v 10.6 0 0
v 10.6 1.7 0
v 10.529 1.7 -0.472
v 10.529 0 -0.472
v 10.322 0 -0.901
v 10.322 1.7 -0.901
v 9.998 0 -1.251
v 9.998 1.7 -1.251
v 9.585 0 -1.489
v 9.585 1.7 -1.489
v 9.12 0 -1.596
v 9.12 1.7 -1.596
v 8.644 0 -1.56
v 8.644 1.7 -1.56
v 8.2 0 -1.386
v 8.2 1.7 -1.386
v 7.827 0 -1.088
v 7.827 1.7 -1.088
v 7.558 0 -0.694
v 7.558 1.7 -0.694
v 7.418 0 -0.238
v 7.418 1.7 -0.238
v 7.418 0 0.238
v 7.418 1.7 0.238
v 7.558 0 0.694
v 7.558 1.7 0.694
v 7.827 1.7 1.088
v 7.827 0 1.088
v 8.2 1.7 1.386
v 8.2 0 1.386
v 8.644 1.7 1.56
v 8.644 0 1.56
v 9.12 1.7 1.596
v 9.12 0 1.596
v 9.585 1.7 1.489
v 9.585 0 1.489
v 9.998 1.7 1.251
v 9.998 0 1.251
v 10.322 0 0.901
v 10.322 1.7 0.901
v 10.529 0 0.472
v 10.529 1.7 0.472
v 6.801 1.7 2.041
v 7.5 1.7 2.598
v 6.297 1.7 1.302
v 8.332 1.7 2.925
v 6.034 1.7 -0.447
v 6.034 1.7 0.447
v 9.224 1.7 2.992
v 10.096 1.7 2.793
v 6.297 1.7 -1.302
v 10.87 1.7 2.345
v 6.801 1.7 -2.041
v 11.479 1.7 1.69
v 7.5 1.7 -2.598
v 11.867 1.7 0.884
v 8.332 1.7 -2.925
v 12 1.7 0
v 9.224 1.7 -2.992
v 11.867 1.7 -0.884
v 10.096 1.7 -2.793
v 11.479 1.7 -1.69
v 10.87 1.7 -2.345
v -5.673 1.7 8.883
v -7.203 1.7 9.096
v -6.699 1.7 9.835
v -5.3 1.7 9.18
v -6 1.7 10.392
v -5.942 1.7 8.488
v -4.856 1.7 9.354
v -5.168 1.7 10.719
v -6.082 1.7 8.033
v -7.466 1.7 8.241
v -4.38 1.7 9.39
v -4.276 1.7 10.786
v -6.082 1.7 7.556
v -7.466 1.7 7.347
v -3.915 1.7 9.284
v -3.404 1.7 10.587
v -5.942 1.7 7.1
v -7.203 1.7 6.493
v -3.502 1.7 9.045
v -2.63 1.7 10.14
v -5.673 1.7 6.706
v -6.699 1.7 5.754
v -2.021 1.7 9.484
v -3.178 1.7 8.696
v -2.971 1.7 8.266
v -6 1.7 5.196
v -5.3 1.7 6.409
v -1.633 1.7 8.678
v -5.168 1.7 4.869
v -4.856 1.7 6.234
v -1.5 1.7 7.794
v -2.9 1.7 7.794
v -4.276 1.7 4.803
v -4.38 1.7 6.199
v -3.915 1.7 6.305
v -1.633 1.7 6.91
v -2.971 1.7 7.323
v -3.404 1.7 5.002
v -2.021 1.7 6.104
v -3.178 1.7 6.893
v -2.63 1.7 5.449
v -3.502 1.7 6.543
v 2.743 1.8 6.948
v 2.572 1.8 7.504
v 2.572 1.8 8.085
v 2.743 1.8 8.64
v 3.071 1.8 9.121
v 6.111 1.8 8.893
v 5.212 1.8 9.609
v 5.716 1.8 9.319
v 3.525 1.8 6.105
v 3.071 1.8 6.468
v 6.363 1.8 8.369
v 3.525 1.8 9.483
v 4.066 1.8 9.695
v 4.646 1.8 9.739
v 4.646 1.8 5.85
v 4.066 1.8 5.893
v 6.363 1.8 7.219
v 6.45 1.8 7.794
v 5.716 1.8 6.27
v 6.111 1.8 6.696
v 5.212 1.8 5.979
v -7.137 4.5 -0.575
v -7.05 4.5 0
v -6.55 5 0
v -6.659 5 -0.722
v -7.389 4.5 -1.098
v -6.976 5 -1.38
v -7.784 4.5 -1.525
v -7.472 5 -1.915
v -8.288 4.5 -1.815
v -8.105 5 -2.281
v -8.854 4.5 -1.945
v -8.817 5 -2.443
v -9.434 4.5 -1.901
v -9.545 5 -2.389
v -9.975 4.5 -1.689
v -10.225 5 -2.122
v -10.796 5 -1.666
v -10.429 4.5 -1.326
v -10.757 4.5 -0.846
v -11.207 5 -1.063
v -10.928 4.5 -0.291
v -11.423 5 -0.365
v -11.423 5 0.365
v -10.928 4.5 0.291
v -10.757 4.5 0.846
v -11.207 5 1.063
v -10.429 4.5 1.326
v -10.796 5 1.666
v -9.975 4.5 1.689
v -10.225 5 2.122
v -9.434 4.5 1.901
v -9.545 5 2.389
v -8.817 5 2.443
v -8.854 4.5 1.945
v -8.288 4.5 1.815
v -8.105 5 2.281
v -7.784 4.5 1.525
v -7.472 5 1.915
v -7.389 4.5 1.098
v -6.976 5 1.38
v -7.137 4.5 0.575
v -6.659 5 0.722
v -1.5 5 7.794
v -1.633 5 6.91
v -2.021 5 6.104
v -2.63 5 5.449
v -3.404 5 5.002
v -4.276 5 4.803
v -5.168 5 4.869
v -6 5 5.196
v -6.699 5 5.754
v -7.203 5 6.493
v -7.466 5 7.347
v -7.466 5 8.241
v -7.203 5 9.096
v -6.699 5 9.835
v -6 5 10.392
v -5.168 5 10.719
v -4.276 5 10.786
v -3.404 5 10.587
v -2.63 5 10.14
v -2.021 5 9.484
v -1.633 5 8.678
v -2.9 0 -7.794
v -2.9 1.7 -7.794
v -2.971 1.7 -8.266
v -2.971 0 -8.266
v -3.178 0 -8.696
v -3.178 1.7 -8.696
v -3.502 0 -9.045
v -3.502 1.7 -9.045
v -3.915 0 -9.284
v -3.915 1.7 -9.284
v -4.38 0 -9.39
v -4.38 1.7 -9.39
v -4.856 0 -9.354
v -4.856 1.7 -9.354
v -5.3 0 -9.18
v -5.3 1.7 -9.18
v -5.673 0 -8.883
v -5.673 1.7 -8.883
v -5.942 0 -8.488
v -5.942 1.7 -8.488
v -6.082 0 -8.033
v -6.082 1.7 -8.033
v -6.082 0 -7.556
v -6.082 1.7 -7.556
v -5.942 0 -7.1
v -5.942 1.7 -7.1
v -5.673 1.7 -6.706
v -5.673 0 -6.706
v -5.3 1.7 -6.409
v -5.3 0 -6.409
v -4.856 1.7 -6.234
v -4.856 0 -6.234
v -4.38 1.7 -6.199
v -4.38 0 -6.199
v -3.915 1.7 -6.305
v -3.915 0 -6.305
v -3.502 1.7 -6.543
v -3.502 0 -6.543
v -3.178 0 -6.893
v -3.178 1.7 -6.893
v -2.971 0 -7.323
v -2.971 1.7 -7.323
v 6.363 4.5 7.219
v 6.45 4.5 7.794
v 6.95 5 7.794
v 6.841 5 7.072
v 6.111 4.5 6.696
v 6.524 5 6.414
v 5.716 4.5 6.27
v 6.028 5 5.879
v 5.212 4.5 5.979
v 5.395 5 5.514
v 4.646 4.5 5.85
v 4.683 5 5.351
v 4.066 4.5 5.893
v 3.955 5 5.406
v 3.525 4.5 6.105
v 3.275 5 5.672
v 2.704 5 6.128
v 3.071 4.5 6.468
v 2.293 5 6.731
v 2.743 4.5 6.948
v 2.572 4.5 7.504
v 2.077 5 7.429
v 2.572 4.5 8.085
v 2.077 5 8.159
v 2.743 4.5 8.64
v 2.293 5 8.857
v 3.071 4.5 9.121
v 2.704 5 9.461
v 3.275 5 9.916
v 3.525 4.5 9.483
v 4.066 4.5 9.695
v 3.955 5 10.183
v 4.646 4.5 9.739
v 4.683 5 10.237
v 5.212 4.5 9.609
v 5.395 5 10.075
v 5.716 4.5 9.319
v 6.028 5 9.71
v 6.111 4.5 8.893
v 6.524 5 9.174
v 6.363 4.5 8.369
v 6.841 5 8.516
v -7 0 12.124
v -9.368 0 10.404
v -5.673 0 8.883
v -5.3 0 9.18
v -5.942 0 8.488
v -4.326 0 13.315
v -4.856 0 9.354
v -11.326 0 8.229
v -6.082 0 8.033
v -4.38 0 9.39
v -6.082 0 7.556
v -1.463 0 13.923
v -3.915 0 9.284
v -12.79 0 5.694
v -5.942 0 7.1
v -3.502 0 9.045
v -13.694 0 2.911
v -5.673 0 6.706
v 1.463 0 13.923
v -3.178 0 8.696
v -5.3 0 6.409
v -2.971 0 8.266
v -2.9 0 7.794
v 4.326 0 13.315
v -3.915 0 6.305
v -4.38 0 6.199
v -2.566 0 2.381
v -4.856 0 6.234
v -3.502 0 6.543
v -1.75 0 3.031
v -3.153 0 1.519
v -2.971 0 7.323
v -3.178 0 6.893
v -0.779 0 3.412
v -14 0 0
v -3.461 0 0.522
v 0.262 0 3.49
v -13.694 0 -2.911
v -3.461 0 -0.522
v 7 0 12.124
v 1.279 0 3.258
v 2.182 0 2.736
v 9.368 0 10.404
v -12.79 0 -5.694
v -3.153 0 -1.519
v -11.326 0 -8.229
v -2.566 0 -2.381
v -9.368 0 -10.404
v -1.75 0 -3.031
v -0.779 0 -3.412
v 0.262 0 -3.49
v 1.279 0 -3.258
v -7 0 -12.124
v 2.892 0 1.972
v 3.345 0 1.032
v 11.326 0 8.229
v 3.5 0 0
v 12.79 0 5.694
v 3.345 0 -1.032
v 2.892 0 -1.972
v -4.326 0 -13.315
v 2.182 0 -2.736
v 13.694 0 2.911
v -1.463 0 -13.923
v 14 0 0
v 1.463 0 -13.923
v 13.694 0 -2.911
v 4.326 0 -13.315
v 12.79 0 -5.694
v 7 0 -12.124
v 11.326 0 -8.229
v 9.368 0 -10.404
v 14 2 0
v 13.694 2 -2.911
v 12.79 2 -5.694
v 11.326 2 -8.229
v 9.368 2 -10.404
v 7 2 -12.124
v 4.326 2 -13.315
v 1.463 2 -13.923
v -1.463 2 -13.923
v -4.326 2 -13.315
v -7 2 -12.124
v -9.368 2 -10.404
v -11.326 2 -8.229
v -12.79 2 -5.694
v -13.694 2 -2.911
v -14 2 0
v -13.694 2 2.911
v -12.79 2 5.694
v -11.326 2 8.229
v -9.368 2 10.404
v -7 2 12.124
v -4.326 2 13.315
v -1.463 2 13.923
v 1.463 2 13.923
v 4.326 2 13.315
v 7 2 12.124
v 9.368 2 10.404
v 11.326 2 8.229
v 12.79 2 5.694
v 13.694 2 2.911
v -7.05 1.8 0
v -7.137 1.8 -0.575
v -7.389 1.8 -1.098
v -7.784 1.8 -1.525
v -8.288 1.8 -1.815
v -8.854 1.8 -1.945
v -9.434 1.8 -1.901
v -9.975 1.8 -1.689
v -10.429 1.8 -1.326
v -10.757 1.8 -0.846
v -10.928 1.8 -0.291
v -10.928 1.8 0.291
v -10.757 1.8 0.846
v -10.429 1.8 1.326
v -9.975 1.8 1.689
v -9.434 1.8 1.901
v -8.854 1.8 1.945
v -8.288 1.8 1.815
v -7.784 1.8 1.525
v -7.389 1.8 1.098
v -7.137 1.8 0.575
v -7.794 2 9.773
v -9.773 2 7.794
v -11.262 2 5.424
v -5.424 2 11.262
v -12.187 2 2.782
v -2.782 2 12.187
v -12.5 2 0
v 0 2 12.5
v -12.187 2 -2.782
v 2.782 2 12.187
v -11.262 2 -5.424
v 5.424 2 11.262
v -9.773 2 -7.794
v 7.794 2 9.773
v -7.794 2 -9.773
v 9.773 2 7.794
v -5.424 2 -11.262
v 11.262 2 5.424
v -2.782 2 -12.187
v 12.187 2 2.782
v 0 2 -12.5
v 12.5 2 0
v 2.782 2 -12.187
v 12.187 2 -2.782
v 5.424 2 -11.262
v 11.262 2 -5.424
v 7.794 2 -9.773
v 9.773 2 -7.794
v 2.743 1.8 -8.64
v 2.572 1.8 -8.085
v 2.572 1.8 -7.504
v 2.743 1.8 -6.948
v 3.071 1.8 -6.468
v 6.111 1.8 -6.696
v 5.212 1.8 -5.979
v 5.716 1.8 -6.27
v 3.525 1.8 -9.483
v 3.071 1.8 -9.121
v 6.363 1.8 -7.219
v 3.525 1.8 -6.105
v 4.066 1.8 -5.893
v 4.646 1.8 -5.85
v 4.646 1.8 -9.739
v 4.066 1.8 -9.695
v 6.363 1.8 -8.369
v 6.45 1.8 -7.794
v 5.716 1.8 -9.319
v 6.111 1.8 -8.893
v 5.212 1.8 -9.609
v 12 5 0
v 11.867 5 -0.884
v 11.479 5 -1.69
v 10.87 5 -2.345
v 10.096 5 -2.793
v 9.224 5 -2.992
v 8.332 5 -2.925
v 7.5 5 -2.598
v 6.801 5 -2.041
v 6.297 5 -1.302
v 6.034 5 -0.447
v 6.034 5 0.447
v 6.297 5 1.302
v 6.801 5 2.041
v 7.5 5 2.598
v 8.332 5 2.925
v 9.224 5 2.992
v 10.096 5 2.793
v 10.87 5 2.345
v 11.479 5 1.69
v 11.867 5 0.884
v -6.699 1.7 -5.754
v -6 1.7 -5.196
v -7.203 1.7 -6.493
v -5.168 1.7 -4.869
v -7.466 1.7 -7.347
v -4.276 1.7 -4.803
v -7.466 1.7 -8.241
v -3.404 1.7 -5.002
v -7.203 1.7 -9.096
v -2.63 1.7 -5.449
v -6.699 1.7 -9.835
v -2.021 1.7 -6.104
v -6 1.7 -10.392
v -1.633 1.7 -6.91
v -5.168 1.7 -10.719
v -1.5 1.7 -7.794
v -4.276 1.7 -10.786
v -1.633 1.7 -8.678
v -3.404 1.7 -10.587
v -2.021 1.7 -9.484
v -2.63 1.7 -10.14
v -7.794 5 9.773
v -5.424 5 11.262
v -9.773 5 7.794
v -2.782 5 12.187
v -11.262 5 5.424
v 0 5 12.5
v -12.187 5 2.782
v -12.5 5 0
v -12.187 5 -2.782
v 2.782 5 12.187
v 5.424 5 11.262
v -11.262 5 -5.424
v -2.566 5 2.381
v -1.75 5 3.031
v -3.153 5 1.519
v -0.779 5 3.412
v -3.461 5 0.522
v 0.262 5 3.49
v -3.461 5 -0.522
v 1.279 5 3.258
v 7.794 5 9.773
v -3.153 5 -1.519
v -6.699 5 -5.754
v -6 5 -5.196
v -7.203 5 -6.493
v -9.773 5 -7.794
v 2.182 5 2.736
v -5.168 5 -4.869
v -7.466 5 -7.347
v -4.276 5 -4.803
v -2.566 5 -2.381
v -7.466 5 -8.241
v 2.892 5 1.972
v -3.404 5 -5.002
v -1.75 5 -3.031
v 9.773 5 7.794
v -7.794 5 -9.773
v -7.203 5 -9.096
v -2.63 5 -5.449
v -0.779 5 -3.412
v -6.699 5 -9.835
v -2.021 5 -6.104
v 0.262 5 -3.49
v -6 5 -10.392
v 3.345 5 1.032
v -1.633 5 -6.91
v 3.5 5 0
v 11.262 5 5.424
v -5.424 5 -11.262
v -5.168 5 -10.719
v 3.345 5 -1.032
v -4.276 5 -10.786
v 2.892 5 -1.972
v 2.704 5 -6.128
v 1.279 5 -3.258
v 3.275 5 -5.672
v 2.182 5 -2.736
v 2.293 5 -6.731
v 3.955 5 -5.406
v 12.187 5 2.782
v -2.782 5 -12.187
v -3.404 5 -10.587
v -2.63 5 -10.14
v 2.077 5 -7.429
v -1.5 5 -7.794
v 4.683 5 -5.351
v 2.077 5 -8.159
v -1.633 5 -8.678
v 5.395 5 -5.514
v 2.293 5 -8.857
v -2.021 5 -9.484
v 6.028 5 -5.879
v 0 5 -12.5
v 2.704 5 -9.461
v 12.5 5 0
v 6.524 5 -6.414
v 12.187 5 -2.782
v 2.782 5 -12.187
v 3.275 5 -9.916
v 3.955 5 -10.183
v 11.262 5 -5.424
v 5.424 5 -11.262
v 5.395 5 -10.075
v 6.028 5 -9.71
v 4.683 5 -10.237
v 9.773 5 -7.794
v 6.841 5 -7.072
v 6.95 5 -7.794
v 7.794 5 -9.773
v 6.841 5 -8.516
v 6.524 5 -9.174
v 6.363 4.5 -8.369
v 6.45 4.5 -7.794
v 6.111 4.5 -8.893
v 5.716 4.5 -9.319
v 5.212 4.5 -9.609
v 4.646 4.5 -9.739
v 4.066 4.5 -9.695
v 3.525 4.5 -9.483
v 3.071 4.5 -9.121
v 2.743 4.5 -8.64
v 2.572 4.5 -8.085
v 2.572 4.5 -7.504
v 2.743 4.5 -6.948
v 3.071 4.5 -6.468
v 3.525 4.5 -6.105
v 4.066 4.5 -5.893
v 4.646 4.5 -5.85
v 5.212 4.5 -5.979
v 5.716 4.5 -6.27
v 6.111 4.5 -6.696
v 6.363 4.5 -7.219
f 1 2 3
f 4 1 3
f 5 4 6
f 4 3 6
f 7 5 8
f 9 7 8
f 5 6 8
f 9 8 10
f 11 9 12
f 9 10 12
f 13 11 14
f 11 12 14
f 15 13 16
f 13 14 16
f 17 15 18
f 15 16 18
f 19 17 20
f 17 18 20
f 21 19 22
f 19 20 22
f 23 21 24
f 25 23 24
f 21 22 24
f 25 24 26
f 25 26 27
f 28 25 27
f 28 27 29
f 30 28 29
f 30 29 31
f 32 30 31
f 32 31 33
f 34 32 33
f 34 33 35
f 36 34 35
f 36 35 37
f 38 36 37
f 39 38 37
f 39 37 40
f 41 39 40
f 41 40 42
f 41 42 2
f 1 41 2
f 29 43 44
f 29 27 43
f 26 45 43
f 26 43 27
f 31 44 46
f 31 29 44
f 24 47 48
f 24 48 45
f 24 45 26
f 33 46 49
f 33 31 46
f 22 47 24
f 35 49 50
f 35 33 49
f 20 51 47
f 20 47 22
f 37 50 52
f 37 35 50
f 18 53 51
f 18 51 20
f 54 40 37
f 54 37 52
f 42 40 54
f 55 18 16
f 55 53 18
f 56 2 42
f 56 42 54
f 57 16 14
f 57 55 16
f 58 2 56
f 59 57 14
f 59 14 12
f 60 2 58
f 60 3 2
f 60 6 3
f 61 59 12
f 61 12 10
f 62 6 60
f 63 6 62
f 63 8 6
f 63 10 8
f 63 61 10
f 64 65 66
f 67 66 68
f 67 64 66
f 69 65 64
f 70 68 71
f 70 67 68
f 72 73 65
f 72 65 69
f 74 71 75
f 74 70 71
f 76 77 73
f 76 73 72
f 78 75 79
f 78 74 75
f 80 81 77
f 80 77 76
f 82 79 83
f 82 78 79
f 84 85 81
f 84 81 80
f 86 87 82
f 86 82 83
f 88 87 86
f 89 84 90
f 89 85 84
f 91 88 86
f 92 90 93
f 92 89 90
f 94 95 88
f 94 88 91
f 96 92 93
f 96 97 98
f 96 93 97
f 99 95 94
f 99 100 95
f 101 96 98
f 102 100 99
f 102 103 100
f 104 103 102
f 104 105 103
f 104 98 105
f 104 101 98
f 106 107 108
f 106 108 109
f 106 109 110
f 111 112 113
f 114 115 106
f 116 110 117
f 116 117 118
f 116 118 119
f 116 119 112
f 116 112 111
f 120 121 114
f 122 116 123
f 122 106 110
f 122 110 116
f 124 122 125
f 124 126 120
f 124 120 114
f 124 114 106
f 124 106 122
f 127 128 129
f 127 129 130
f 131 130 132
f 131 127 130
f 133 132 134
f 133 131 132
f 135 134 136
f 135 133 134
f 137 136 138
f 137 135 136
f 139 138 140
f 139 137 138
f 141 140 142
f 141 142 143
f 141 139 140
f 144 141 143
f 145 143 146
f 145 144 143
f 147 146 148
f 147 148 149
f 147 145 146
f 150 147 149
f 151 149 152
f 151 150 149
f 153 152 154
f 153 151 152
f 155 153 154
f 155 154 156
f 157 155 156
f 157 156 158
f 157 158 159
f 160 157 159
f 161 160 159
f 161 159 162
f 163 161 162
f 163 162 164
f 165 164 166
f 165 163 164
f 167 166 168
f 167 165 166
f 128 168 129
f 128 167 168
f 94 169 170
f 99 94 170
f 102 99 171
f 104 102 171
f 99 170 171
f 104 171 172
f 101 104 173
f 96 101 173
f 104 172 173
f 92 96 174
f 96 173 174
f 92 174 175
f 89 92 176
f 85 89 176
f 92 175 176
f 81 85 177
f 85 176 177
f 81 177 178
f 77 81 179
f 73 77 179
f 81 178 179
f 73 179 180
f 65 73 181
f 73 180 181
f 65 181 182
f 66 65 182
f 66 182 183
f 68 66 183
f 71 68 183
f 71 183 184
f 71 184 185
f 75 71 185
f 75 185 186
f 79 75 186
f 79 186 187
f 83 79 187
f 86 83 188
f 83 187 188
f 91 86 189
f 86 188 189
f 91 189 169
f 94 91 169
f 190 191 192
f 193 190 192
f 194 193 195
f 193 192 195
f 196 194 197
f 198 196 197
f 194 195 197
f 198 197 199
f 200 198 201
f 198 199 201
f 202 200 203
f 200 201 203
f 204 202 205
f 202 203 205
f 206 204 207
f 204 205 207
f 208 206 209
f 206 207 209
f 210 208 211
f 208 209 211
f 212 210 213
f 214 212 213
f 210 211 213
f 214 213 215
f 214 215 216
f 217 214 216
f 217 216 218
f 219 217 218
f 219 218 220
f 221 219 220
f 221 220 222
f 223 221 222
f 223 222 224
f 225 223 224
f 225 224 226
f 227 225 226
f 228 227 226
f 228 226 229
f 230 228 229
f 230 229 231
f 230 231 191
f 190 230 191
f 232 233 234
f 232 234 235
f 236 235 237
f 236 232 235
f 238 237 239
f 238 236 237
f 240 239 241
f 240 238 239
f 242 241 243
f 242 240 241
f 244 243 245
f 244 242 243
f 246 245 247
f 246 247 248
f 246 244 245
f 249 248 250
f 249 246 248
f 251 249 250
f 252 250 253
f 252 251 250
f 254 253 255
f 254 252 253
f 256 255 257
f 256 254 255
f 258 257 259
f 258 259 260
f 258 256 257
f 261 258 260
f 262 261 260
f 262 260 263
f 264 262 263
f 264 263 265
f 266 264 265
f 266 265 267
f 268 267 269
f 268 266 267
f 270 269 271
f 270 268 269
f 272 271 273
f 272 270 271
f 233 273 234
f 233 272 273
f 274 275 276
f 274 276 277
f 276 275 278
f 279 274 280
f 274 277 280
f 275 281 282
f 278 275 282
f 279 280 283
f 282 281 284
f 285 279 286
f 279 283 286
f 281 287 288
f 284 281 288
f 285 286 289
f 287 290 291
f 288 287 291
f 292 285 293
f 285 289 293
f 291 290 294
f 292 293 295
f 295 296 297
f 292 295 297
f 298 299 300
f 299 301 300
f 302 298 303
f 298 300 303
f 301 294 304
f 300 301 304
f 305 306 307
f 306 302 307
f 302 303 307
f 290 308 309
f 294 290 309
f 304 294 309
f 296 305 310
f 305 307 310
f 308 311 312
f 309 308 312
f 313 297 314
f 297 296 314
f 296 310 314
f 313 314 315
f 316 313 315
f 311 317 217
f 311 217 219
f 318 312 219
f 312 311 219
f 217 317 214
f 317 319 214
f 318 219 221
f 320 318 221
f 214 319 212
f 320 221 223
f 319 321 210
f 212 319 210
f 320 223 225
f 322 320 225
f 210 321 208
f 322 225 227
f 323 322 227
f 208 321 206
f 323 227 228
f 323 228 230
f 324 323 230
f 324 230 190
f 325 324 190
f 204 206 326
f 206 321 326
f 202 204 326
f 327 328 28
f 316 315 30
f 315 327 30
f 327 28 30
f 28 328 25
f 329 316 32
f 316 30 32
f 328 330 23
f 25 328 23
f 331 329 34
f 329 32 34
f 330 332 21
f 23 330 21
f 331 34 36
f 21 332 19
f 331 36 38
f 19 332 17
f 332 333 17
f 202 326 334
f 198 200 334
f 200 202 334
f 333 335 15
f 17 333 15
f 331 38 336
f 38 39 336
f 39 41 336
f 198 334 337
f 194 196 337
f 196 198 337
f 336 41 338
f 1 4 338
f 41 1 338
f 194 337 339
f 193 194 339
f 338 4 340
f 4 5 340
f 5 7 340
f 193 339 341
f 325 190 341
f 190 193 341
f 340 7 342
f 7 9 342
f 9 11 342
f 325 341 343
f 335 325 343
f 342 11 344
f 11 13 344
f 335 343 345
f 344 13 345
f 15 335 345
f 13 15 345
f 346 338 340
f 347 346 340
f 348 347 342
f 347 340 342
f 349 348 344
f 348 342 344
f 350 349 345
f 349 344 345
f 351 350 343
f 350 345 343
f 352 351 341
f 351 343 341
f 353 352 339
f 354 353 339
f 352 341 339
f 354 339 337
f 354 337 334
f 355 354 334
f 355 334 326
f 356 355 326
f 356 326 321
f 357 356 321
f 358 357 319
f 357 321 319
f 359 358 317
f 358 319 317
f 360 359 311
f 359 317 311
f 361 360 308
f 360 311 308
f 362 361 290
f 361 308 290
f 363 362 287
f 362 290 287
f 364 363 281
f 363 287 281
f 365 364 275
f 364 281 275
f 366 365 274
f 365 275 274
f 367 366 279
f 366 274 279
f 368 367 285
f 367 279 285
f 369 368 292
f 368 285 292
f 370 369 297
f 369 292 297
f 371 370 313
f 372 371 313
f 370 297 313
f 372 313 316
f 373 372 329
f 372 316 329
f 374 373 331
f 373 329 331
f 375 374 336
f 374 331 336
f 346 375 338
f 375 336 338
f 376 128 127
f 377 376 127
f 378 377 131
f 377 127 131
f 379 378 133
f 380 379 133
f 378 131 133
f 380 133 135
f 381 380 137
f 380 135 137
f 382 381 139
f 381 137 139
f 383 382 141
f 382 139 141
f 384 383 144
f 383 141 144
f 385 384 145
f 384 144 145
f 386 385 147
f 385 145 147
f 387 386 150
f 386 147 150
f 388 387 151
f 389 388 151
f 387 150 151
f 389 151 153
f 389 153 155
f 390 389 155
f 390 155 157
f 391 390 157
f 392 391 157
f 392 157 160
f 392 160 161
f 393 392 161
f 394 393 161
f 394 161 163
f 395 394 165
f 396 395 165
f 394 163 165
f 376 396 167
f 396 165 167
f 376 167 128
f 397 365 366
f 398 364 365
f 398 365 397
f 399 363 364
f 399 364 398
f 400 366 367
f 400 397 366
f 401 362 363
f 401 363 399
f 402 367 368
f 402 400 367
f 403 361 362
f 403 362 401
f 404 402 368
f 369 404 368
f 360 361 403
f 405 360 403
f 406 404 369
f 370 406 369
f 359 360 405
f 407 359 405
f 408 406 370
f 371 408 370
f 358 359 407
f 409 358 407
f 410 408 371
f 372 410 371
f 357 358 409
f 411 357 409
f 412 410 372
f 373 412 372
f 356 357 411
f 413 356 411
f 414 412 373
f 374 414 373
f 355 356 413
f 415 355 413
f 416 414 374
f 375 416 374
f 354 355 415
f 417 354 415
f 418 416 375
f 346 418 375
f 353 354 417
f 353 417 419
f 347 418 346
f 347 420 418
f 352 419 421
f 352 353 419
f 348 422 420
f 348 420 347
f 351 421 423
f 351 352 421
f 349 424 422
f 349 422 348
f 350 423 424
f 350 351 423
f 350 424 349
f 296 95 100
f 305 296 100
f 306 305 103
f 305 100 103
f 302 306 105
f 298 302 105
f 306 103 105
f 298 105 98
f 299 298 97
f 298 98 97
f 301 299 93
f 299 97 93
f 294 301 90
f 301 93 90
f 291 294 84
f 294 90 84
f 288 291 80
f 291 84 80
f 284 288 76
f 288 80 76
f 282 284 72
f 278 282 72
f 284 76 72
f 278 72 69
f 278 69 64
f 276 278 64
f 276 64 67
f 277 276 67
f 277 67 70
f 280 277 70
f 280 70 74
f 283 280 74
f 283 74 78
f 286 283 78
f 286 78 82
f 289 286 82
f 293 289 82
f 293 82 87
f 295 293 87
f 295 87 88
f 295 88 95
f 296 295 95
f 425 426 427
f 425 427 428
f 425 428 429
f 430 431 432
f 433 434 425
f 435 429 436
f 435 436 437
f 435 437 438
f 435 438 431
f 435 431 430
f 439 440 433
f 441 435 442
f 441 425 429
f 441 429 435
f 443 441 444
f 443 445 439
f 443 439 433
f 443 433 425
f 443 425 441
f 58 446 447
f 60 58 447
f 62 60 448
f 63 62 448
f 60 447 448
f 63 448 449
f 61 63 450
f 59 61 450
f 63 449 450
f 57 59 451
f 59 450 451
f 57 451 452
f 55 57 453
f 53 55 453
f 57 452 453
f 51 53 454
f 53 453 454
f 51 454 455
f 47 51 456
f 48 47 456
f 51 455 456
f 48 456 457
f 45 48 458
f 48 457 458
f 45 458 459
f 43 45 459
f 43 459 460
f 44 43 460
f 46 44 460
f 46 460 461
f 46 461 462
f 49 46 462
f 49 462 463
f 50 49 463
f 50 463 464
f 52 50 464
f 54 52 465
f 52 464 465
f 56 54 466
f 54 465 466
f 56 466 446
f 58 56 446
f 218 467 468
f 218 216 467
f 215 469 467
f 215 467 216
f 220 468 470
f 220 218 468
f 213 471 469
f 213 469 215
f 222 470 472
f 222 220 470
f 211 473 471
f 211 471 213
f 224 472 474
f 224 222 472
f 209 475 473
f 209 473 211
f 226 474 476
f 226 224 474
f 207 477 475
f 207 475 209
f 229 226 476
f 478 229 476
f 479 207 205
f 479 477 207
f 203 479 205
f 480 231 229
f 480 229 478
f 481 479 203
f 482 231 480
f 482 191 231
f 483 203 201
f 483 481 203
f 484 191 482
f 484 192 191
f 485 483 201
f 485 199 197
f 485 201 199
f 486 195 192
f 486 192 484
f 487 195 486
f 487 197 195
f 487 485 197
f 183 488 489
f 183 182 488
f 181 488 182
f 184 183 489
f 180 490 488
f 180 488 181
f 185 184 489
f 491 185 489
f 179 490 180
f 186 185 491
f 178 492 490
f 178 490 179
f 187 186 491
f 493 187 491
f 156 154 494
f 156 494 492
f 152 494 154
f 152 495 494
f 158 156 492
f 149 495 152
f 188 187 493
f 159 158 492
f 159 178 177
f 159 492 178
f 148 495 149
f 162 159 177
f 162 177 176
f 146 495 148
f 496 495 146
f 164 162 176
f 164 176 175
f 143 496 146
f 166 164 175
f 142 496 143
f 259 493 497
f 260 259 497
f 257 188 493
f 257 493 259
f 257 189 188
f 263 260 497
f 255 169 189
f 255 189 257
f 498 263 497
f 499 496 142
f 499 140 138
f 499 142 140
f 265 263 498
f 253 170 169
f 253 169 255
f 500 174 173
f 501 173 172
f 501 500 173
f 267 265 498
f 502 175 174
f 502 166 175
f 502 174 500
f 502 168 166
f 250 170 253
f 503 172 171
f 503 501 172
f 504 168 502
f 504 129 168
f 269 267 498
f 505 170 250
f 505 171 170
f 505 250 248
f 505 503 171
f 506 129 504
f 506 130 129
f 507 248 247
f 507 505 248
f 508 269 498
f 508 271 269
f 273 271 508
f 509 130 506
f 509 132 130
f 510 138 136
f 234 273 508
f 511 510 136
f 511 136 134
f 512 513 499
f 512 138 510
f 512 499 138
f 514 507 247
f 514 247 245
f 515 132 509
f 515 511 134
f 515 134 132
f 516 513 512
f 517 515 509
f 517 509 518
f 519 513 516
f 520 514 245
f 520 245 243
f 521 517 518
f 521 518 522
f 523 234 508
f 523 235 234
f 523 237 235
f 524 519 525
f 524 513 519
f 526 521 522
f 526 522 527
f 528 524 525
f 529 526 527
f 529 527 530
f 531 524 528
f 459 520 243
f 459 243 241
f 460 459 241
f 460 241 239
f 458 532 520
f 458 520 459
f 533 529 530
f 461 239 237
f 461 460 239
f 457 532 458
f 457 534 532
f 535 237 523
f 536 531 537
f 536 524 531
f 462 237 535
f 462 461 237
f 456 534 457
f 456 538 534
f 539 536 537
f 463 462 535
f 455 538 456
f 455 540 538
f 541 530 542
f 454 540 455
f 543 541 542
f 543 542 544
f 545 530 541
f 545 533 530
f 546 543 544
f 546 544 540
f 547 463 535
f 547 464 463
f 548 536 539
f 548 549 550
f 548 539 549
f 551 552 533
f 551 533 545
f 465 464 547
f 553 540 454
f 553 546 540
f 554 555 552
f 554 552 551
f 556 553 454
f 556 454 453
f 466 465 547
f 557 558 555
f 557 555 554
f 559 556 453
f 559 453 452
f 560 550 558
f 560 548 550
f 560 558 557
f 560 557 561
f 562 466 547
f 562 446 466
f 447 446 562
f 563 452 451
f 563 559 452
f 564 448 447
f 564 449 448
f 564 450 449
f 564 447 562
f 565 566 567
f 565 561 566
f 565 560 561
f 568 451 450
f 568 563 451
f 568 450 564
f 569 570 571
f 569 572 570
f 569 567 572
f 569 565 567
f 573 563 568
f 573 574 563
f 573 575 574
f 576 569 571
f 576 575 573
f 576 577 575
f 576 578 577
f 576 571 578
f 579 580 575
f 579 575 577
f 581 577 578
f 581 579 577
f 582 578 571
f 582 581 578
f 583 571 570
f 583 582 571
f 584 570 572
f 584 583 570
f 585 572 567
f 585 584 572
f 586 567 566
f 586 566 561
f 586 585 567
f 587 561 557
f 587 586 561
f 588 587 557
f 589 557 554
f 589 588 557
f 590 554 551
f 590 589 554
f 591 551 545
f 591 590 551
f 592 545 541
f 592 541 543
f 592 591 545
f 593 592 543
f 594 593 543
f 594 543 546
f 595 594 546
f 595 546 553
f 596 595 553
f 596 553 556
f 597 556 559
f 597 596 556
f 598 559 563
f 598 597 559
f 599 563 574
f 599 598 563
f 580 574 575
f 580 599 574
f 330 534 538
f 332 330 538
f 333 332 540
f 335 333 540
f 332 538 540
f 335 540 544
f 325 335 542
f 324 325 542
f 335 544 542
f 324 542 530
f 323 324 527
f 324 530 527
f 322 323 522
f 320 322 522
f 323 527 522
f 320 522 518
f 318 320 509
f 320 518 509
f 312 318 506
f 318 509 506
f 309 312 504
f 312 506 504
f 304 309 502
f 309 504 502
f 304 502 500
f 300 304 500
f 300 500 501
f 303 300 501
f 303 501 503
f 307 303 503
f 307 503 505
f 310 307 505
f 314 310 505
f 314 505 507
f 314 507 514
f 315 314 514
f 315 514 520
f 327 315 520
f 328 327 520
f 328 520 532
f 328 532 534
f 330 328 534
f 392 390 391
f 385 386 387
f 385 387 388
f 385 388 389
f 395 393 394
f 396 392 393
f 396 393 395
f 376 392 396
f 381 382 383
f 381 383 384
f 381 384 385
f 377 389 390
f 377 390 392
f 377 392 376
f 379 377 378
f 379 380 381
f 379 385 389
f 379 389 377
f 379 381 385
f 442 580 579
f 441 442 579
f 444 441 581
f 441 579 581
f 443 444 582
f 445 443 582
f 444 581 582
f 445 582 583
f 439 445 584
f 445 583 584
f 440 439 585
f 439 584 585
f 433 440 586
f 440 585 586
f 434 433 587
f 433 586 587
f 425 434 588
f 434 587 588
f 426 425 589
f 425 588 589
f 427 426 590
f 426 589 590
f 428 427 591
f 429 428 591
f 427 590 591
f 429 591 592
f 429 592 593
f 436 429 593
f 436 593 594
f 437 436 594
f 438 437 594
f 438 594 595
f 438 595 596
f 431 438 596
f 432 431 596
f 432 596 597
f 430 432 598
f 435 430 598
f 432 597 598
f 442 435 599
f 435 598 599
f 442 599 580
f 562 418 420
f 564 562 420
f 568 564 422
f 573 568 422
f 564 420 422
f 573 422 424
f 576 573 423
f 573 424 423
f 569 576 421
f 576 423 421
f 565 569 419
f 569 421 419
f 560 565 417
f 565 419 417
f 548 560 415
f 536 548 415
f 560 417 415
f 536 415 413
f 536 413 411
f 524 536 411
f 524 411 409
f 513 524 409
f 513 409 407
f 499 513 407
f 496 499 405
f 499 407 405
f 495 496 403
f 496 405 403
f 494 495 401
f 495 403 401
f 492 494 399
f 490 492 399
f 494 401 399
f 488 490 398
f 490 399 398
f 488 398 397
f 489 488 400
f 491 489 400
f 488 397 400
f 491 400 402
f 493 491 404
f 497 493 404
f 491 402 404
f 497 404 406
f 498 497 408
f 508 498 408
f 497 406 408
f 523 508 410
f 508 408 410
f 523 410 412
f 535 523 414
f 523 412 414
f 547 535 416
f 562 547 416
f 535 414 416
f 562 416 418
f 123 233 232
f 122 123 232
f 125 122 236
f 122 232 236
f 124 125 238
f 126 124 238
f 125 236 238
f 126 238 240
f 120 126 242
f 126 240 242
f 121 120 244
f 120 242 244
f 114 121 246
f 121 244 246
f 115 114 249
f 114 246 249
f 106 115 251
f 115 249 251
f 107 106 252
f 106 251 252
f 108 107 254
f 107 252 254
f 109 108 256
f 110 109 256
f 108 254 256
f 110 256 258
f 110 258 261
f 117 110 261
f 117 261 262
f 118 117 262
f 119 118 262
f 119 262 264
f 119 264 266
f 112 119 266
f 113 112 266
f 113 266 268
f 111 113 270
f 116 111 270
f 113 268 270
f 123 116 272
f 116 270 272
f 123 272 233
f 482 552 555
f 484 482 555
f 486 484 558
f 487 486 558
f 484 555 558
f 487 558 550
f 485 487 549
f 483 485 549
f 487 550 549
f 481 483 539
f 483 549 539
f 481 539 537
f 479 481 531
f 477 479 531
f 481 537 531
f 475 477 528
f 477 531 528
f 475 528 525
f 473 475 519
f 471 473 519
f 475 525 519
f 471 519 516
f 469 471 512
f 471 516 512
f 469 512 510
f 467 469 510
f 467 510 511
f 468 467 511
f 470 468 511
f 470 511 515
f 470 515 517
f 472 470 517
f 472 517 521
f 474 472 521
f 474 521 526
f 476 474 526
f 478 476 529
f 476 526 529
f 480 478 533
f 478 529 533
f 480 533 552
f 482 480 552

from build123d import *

# Parameters (mm, degrees)
SKETCH_1_R          = 14
EXTRUDE_1_DEPTH     = 2
SKETCH_2_R          = 12.5
EXTRUDE_2_DEPTH     = 3
SKETCH_3_R          = 1.6
CUT_EXTRUDE_1_DEPTH = 6
SKETCH_4_R          = 3
CUT_EXTRUDE_2_DEPTH = 3.3
SKETCH_5_R          = 1.95
CUT_EXTRUDE_3_DEPTH = 3.2
CHAMFER_1_SIZE      = 0.5
SKETCH_6_R          = 3.5
CUT_EXTRUDE_4_DEPTH = 6


with BuildPart() as part:
    # 草图1 → 凸台-拉伸1 (new body)
    with BuildSketch(Plane(origin=(0, 0, 0), x_dir=(1, 0, 0), z_dir=(0, 1, 0))):
        Circle(SKETCH_1_R)
    extrude(amount=EXTRUDE_1_DEPTH)

    # 草图2 → 凸台-拉伸2 (add)
    with BuildSketch(Plane(origin=(0, 2, 0), x_dir=(1, 0, 0), z_dir=(0, 1, 0))):
        Circle(SKETCH_2_R)
    extrude(amount=EXTRUDE_2_DEPTH)

    # 草图3 → 切除-拉伸1 (cut, through all)
    with BuildSketch(Plane(origin=(0, 5, 0), x_dir=(1, 0, 0), z_dir=(0, 1, 0))):
        with Locations((9, 0)):
            Circle(SKETCH_3_R)
        with Locations((-4.5, -7.794228634)):
            Circle(SKETCH_3_R)
        with Locations((-4.5, 7.794228634)):
            Circle(SKETCH_3_R)
    extrude(amount=-CUT_EXTRUDE_1_DEPTH, mode=Mode.SUBTRACT)

    # 草图4 → 切除-拉伸2 (cut)
    with BuildSketch(Plane(origin=(0, 5, 0), x_dir=(1, 0, 0), z_dir=(0, 1, 0))):
        with Locations((9, 0)):
            Circle(SKETCH_4_R)
        with Locations((-4.5, 7.794228634)):
            Circle(SKETCH_4_R)
        with Locations((-4.5, -7.794228634)):
            Circle(SKETCH_4_R)
    extrude(amount=-CUT_EXTRUDE_2_DEPTH, mode=Mode.SUBTRACT)

    # 草图5 → 切除-拉伸3 (cut)
    with BuildSketch(Plane(origin=(0, 5, 0), x_dir=(1, 0, 0), z_dir=(0, 1, 0))):
        with Locations((4.5, 7.794228634)):
            Circle(SKETCH_5_R)
        with Locations((4.5, -7.794228634)):
            Circle(SKETCH_5_R)
        with Locations((-9, 0)):
            Circle(SKETCH_5_R)
    extrude(amount=-CUT_EXTRUDE_3_DEPTH, mode=Mode.SUBTRACT)

    # 倒角1
    chamfer_1_edges = [part.edges().sort_by_distance(p)[0] for p in [
        (2.55, 5, -7.794228634),
        (2.55, 5, 7.794228634),
        (-10.95, 5, 0),
    ]]
    chamfer(chamfer_1_edges, length=CHAMFER_1_SIZE)

    # 草图6 → 切除-拉伸4 (cut, through all)
    with BuildSketch(Plane(origin=(0, 5, 0), x_dir=(1, 0, 0), z_dir=(0, 1, 0))):
        Circle(SKETCH_6_R)
    extrude(amount=-CUT_EXTRUDE_4_DEPTH, mode=Mode.SUBTRACT)


solid = part.part
